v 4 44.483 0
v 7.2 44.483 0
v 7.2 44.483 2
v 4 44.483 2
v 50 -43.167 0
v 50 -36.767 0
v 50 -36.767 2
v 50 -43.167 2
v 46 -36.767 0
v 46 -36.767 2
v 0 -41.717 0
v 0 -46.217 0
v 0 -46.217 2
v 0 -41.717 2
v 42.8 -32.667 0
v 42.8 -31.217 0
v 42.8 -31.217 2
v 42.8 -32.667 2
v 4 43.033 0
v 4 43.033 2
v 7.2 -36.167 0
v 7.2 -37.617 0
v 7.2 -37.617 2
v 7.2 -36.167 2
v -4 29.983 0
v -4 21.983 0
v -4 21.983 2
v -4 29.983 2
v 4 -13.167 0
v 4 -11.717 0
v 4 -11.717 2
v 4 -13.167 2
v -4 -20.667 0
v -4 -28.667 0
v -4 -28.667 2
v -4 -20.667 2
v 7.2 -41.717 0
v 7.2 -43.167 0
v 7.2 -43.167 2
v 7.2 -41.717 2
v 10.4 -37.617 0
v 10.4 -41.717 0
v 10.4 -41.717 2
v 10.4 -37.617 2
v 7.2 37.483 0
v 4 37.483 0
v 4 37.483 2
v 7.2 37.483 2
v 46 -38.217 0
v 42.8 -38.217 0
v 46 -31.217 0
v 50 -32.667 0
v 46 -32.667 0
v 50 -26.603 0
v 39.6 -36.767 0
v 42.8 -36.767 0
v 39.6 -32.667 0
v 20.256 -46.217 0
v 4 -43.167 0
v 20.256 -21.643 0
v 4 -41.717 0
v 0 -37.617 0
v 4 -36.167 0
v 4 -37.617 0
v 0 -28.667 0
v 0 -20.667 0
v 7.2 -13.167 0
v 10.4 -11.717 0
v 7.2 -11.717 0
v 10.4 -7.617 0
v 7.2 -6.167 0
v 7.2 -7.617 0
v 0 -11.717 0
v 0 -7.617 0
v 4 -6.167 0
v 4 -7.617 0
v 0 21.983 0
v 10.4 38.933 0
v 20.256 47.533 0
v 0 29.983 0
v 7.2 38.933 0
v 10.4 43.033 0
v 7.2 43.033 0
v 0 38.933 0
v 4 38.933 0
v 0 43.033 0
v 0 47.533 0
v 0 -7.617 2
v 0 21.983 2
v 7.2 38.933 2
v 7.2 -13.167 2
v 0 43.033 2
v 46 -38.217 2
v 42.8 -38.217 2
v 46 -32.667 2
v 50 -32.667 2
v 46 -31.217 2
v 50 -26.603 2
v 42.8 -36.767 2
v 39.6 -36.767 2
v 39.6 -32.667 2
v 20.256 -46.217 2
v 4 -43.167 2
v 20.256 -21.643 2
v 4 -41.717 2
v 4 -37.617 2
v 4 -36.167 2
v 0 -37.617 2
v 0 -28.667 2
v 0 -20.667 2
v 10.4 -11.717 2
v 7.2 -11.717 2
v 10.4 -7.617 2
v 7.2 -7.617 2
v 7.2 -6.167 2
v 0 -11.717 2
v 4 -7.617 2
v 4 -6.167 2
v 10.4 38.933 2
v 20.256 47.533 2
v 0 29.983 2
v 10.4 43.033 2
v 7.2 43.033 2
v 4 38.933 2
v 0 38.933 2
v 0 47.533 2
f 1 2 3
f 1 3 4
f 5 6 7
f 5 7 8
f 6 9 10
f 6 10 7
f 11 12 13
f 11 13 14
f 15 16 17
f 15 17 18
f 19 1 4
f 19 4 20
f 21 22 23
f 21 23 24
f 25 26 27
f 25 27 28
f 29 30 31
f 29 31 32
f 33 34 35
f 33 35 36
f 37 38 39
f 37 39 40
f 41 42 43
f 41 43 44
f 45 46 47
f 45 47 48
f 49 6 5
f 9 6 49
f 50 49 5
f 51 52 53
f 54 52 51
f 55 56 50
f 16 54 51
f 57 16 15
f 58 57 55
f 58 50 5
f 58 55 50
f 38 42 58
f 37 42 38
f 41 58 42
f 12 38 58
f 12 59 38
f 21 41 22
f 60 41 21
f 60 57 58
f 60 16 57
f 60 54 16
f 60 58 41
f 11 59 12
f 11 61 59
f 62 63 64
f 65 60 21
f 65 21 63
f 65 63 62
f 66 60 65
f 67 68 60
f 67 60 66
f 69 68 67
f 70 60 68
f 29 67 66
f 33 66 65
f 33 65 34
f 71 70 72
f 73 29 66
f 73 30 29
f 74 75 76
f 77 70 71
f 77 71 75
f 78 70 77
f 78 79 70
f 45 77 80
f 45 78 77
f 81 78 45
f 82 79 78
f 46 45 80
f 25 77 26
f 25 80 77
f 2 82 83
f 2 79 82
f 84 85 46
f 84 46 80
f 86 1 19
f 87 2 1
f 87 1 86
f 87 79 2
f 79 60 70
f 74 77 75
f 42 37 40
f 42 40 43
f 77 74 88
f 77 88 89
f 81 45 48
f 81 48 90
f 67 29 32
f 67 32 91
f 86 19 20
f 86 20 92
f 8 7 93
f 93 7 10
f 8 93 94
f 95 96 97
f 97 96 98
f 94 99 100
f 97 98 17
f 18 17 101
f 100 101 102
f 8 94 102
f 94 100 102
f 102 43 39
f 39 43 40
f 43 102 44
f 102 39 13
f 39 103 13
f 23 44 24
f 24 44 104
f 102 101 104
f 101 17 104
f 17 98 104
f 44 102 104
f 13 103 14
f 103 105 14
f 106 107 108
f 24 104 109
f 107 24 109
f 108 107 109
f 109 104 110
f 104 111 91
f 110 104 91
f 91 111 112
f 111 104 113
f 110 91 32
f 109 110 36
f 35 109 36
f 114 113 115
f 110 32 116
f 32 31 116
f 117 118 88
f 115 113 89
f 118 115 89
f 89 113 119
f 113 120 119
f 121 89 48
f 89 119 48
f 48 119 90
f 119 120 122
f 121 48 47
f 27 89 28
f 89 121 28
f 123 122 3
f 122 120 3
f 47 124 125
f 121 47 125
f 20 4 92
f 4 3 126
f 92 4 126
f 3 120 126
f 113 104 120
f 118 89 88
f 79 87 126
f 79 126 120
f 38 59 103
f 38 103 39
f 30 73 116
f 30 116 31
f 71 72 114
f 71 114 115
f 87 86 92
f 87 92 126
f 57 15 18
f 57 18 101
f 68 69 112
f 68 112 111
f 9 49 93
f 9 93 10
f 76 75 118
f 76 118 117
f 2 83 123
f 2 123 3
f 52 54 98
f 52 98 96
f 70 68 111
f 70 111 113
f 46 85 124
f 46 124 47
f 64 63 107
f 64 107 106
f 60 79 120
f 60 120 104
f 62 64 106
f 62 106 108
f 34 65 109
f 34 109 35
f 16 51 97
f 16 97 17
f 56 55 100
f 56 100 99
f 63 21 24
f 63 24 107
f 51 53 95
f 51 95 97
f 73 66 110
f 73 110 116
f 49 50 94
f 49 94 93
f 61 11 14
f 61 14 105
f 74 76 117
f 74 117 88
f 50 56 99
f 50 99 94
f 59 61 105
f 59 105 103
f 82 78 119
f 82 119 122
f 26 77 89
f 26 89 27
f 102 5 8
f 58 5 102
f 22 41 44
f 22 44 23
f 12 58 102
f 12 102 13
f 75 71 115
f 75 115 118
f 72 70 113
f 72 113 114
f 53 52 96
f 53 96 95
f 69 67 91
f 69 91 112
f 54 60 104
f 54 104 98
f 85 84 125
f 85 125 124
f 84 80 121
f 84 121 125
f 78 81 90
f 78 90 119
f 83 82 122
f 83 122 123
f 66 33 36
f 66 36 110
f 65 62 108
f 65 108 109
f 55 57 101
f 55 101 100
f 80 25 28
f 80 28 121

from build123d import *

# Parameters (mm, degrees)
EXTRUDE_1_DEPTH = 2


with BuildPart() as part:
    # 草图1 → 凸台-拉伸1 (new body)
    with BuildSketch(Plane.XY):
        Polygon((0, 38.932825237), (4, 38.932825237), (4, 37.482825237), (7.2, 37.482825237), (7.2, 38.932825237), (10.4, 38.932825237), (10.4, 43.032825237), (7.2, 43.032825237), (7.2, 44.482825237), (4, 44.482825237), (4, 43.032825237), (0, 43.032825237), (0, 47.532825237), (20.256410548, 47.532825237), (20.256410548, -21.642820465), (50, -26.602653907), (50, -32.667083917), (46, -32.667083917), (46, -31.217083917), (42.8, -31.217083917), (42.8, -32.667083917), (39.6, -32.667083917), (39.6, -36.767083917), (42.8, -36.767083917), (42.8, -38.217083917), (46, -38.217083917), (46, -36.767083917), (50, -36.767083917), (50, -43.167174763), (20.256410548, -46.217174763), (0, -46.217174763), (0, -41.717174763), (4, -41.717174763), (4, -43.167174763), (7.2, -43.167174763), (7.2, -41.717174763), (10.4, -41.717174763), (10.4, -37.617174763), (7.2, -37.617174763), (7.2, -36.167174763), (4, -36.167174763), (4, -37.617174763), (0, -37.617174763), (0, -28.667174763), (-4, -28.667174763), (-4, -20.667174763), (0, -20.667174763), (0, -11.717174763), (4, -11.717174763), (4, -13.167174763), (7.2, -13.167174763), (7.2, -11.717174763), (10.4, -11.717174763), (10.4, -7.617174763), (7.2, -7.617174763), (7.2, -6.167174763), (4, -6.167174763), (4, -7.617174763), (0, -7.617174763), (0, 21.982825237), (-4, 21.982825237), (-4, 29.982825237), (0, 29.982825237), align=None)
    extrude(amount=EXTRUDE_1_DEPTH)


solid = part.part
